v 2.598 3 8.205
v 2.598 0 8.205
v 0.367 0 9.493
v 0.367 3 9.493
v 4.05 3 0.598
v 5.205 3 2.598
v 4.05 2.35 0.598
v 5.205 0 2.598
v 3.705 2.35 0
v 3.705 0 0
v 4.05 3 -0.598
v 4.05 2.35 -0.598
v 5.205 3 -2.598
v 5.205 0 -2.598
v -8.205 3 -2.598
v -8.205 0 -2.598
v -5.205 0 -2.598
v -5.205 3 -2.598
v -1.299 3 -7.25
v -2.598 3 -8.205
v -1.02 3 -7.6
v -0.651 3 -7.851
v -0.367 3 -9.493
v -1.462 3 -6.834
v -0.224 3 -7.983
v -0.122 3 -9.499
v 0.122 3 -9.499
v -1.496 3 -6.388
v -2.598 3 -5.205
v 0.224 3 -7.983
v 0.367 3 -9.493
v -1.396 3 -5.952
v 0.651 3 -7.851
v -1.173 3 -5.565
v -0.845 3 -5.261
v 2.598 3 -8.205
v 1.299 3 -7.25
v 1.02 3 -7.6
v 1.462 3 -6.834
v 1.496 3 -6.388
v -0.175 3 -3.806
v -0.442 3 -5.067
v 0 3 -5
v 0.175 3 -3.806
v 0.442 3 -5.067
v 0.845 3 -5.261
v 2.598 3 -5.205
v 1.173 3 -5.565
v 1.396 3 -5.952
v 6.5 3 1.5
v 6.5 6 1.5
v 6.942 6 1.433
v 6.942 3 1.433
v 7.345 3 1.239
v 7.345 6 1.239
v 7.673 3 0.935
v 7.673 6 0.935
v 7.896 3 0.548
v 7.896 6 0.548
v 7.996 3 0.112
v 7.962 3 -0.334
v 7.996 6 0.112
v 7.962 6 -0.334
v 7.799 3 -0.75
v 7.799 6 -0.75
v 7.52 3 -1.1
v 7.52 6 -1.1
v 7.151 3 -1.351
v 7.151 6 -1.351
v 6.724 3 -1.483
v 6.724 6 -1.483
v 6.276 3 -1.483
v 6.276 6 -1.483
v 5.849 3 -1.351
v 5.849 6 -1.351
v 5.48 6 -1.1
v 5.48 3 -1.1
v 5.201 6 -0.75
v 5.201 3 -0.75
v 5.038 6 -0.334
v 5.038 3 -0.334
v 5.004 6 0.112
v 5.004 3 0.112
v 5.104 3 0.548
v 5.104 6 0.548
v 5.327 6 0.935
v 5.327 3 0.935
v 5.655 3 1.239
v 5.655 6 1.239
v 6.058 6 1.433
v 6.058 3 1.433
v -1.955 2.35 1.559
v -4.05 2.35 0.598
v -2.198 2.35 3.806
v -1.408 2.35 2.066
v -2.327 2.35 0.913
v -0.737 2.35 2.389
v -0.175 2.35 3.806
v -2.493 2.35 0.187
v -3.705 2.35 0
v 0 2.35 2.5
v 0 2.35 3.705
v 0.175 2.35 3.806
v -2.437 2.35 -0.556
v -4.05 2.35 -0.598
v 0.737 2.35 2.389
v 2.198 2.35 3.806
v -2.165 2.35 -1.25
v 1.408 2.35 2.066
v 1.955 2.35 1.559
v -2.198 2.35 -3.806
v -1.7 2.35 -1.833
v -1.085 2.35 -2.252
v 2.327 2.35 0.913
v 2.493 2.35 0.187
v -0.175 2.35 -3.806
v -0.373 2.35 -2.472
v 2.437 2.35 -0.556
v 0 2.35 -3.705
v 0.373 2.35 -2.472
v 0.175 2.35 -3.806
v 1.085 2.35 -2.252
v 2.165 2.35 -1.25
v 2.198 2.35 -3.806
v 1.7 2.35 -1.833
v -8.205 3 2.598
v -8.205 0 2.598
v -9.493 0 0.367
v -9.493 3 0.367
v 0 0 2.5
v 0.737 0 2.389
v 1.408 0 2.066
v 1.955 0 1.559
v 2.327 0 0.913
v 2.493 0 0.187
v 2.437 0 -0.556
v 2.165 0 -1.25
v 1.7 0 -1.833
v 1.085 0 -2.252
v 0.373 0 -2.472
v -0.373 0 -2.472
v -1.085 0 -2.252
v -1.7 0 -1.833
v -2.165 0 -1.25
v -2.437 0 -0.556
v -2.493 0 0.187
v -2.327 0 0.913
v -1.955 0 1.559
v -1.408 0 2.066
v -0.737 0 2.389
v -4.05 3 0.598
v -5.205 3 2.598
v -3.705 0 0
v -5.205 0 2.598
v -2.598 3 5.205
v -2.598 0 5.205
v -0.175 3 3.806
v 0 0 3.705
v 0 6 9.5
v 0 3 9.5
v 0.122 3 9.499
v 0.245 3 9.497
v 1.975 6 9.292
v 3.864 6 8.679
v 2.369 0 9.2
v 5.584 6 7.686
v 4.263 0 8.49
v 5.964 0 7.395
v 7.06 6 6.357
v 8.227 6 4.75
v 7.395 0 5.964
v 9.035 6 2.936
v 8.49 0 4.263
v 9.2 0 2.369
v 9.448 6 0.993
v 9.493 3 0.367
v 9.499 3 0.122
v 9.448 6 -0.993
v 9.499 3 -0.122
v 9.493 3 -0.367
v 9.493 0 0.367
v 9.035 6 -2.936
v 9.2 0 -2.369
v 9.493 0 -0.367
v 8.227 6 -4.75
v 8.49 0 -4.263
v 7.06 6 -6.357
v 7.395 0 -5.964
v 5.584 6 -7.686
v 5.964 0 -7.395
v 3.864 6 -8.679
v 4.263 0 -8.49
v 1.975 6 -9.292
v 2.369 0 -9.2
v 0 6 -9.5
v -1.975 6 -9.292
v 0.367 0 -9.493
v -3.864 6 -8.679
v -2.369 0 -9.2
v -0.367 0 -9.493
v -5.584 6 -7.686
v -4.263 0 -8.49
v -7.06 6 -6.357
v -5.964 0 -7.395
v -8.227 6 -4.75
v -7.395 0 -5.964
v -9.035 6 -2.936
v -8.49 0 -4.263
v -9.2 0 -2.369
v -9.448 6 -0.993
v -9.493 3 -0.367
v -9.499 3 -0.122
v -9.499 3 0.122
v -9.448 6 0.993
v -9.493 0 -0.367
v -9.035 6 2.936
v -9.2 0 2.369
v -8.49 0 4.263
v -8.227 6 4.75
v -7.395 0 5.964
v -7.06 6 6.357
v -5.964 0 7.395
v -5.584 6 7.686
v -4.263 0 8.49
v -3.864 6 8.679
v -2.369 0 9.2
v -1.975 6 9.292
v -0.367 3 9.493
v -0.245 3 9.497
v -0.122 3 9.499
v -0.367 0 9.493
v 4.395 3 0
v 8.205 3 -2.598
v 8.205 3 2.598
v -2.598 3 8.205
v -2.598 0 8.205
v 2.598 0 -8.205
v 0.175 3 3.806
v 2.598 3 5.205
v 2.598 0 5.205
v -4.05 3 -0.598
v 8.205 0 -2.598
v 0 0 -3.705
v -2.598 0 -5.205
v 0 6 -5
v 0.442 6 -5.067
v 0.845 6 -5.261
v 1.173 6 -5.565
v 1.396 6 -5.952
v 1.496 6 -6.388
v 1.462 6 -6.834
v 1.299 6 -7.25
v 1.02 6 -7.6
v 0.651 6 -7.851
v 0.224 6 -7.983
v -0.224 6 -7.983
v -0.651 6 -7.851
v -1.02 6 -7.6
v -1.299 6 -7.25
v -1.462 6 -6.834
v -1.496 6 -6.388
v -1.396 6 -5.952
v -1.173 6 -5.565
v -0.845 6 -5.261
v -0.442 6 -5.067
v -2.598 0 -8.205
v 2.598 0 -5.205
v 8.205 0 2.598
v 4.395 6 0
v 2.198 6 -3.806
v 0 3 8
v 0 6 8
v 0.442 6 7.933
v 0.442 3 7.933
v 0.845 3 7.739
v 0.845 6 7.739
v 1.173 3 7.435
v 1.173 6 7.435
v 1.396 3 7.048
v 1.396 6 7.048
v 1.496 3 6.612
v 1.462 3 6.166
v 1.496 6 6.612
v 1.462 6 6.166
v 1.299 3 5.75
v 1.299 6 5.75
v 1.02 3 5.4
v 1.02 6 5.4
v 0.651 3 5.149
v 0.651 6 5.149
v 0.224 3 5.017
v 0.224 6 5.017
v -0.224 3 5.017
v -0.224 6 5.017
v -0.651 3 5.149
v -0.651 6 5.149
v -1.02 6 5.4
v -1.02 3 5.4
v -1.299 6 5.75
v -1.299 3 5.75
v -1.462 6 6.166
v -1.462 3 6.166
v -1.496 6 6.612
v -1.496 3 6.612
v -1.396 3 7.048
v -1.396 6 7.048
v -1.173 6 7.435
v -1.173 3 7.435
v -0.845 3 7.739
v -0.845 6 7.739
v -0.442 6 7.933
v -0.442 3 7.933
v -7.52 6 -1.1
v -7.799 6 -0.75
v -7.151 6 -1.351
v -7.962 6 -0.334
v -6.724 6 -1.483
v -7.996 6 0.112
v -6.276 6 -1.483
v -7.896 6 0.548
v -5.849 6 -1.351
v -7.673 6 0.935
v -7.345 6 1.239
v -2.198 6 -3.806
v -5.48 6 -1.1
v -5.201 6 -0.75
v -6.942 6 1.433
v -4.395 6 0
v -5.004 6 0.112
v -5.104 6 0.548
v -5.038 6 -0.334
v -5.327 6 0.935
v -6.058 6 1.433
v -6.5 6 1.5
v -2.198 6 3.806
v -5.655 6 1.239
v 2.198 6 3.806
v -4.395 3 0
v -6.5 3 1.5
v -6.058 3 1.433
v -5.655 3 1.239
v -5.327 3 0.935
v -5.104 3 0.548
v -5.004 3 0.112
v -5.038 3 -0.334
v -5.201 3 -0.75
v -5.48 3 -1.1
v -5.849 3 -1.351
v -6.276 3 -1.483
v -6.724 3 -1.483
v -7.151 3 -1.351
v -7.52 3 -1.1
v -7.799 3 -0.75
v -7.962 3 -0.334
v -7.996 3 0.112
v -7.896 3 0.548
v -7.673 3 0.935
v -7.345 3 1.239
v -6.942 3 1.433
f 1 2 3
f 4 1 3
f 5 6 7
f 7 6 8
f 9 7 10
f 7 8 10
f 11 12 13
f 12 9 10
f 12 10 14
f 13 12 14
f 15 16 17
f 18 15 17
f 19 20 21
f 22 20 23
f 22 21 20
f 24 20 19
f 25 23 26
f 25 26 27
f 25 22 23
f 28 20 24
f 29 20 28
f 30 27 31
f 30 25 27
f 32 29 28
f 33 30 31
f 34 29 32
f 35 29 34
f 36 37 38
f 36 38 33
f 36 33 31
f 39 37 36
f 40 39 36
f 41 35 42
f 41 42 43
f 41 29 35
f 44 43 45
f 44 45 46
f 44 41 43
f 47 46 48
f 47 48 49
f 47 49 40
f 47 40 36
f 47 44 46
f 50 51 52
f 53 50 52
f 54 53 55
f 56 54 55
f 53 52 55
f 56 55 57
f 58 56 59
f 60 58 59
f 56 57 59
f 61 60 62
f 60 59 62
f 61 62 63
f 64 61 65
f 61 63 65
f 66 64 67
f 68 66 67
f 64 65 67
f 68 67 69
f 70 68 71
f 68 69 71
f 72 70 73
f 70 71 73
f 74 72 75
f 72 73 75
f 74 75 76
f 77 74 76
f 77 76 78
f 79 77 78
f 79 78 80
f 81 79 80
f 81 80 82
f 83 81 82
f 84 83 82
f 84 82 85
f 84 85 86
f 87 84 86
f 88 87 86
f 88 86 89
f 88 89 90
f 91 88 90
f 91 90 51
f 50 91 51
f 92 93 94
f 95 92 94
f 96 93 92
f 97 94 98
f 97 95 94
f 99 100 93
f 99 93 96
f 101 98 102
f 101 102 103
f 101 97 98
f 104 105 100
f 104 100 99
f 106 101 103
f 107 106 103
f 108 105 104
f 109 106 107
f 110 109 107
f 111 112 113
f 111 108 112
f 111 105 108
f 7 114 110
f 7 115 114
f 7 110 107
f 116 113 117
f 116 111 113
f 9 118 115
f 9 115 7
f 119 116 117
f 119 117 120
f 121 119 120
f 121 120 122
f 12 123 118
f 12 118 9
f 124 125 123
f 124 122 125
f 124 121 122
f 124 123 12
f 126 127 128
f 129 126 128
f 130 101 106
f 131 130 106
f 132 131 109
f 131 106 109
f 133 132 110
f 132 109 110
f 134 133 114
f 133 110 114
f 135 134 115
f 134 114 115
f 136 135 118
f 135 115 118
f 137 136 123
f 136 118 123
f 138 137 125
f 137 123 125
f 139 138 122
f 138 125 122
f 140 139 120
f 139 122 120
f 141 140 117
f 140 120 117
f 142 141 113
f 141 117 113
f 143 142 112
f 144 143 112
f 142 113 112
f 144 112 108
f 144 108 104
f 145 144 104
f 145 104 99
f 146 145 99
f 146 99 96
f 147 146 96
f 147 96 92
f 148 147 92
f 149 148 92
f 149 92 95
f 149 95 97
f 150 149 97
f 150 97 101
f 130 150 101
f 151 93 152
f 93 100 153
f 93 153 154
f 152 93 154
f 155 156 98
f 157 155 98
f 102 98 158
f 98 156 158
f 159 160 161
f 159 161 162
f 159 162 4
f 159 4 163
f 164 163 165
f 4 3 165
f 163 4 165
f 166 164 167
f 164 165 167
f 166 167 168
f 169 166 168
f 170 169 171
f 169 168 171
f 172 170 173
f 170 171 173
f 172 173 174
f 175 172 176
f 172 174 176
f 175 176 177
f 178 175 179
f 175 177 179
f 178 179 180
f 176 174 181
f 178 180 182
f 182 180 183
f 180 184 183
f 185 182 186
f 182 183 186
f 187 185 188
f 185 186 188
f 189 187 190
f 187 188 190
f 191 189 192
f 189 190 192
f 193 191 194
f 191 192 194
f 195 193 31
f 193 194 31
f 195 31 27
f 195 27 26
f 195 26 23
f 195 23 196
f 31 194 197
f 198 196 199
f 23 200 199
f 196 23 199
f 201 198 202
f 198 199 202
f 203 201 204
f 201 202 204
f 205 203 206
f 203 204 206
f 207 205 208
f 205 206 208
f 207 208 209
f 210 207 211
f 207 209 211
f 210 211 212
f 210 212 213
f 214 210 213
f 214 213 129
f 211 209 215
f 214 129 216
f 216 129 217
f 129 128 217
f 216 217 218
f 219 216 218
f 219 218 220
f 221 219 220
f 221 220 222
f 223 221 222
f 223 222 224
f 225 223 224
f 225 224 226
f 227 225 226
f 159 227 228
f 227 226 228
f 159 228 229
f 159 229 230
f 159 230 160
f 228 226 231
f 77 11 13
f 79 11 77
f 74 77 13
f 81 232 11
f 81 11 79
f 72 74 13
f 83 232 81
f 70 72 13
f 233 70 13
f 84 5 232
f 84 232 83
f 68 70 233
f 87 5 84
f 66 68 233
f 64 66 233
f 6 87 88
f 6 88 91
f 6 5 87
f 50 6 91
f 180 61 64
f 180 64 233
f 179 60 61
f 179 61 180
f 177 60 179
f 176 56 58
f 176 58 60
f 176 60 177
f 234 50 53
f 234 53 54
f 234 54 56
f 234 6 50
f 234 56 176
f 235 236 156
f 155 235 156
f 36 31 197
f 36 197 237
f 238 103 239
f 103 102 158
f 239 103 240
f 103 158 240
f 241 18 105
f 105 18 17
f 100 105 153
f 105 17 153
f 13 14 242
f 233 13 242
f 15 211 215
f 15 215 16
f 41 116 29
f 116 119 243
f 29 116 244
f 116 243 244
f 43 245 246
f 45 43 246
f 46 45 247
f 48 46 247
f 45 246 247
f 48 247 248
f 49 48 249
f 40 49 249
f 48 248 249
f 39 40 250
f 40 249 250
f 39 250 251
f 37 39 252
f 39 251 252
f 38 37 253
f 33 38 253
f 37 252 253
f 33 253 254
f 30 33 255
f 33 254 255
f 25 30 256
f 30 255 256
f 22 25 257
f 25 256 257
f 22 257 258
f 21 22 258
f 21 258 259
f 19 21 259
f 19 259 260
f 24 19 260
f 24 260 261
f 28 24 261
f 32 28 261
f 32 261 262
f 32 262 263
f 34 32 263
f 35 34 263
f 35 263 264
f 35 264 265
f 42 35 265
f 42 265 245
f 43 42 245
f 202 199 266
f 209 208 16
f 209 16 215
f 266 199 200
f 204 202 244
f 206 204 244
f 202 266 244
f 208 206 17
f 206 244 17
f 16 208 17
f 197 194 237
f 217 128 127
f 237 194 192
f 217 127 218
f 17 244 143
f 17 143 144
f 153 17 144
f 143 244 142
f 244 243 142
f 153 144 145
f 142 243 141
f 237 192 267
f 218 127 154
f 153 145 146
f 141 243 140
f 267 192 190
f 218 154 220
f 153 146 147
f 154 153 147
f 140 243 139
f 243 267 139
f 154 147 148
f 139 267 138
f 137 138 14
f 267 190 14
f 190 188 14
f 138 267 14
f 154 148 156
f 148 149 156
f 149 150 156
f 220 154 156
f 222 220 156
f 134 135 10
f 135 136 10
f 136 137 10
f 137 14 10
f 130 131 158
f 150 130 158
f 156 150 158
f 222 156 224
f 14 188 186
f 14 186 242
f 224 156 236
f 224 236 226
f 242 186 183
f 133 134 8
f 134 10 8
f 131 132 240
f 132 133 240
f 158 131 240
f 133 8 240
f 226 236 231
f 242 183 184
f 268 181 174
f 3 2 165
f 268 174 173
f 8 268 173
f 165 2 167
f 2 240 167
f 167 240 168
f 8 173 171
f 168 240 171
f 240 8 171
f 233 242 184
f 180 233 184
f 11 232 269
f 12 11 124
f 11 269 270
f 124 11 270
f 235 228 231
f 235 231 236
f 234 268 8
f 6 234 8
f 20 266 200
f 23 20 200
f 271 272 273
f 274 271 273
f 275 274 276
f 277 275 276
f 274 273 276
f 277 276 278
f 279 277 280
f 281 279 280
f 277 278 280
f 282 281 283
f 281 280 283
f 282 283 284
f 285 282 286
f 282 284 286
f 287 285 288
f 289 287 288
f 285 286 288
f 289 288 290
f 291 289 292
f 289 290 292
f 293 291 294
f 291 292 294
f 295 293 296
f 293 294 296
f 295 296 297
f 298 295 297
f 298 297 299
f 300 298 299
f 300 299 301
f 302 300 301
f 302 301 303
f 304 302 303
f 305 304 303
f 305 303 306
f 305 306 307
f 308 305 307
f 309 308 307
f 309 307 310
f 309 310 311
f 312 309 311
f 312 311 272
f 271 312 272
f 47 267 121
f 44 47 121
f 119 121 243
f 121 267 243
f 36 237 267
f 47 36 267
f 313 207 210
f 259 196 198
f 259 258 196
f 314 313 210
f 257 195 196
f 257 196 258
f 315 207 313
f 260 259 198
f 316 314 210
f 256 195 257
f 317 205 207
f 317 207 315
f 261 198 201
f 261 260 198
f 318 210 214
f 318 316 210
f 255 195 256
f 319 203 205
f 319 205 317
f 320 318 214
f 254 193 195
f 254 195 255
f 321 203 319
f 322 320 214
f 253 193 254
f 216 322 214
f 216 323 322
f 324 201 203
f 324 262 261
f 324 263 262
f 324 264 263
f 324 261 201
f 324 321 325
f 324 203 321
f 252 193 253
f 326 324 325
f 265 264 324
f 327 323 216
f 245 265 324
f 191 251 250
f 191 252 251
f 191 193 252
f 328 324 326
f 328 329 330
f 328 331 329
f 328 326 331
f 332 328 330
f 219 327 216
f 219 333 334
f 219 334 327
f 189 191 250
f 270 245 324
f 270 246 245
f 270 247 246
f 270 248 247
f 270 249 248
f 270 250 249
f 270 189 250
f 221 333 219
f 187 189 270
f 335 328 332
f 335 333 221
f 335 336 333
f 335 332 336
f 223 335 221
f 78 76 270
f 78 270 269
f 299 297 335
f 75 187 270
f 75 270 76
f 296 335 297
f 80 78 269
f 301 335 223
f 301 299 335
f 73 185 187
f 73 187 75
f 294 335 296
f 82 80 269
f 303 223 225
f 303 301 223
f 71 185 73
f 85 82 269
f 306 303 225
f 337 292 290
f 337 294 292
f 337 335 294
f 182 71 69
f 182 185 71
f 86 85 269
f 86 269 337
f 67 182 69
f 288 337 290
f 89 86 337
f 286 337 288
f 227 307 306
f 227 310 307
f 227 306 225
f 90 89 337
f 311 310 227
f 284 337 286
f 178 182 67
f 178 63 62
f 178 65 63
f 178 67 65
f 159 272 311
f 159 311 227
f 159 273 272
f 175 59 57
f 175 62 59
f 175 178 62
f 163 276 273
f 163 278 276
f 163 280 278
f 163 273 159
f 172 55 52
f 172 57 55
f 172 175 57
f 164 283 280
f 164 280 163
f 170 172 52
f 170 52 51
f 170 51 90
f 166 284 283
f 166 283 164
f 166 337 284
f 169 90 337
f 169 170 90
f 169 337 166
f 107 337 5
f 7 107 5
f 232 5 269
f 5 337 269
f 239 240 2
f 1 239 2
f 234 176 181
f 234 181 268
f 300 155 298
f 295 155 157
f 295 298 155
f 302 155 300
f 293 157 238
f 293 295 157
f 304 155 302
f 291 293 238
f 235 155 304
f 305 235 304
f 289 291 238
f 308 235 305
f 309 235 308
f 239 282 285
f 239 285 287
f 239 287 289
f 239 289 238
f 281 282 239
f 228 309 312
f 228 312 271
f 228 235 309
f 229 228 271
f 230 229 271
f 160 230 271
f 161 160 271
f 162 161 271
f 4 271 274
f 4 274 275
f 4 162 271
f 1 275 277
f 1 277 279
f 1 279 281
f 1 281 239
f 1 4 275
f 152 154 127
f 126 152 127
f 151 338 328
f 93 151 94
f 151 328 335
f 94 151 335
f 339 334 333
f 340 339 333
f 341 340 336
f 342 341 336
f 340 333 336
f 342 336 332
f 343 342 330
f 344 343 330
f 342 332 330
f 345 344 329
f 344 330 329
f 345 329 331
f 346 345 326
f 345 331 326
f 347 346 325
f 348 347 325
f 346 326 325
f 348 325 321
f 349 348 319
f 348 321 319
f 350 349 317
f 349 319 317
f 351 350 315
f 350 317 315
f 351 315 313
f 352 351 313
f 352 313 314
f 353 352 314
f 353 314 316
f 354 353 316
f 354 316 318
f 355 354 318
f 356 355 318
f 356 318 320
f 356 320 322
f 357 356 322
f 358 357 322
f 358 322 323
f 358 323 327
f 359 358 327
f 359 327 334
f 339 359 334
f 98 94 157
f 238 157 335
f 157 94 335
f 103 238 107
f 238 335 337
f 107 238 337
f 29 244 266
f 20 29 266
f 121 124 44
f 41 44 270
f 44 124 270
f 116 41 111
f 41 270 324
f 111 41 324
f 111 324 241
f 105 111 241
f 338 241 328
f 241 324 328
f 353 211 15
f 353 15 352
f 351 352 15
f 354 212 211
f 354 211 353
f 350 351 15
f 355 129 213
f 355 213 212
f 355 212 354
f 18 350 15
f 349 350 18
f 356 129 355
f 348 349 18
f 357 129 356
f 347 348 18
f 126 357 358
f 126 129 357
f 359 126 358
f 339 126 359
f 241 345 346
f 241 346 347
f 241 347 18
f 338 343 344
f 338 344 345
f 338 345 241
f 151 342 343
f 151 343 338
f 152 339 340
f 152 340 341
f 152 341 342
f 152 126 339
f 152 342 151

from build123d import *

# Parameters (mm, degrees)
SKETCH2_R           = 9.5
BOSS_EXTRUDE1_DEPTH = 6
CUT_EXTRUDE1_DEPTH  = 3.65
SKETCH4_R           = 2.5
CUT_EXTRUDE2_DEPTH  = 14.92201494
CUT_EXTRUDE4_DEPTH  = 3
SKETCH5_R           = 1.5
CUT_EXTRUDE5_DEPTH  = 15.71393897


with BuildPart() as part:
    # Sketch2 → Boss-Extrude1 (new body)
    with BuildSketch(Plane(origin=(0, 0, 0), x_dir=(1, 0, 0), z_dir=(0, 1, 0))):
        with Locations(Location((0, 0, 0), (0, 0, 270))):
            Circle(SKETCH2_R)
    extrude(amount=BOSS_EXTRUDE1_DEPTH)

    # Sketch3 → Cut-Extrude1 (cut)
    with BuildSketch(Plane(origin=(0, 6, 0), x_dir=(1, 0, 0), z_dir=(0, 1, 0))):
        Polygon((2.1975, -3.80618165), (4.395, 0), (2.1975, 3.80618165), (-2.1975, 3.80618165), (-4.395, 0), (-2.1975, -3.80618165), align=None)
    extrude(amount=-CUT_EXTRUDE1_DEPTH, mode=Mode.SUBTRACT)

    # Sketch4 → Cut-Extrude2 (cut, through all)
    with BuildSketch(Plane(origin=(0, 2.35, 0), x_dir=(1, 0, 0), z_dir=(0, 1, 0))):
        with Locations(Location((0, 0, 0), (0, 0, 270))):
            Circle(SKETCH4_R)
    extrude(amount=-CUT_EXTRUDE2_DEPTH, mode=Mode.SUBTRACT)

    # Sketch6 → Cut-Extrude4 (cut)
    with BuildSketch(Plane.XZ):
        Polygon((-2.598076211, -8.204916605), (0, -9.704916605), (2.598076211, -8.204916605), (2.598076211, -5.204916605), (0, -3.704916605), (-2.598076211, -5.204916605), align=None)
        Polygon((8.204916605, -2.598076211), (9.704916605, 0), (8.204916605, 2.598076211), (5.204916605, 2.598076211), (3.704916605, 0), (5.204916605, -2.598076211), align=None)
        Polygon((-8.204916605, 2.598076211), (-9.704916605, 0), (-8.204916605, -2.598076211), (-5.204916605, -2.598076211), (-3.704916605, 0), (-5.204916605, 2.598076211), align=None)
        Polygon((2.598076211, 8.204916605), (0, 9.704916605), (-2.598076211, 8.204916605), (-2.598076211, 5.204916605), (0, 3.704916605), (2.598076211, 5.204916605), align=None)
    extrude(amount=-CUT_EXTRUDE4_DEPTH, mode=Mode.SUBTRACT)

    # Sketch5 → Cut-Extrude5 (cut, through all)
    with BuildSketch(Plane(origin=(0, 6, 0), x_dir=(1, 0, 0), z_dir=(0, 1, 0))):
        with Locations(Location((6.5, 0, 0), (0, 0, 270))):
            Circle(SKETCH5_R)
        with Locations(Location((0, -6.5, 0), (0, 0, 270))):
            Circle(SKETCH5_R)
        with Locations(Location((-6.5, 0, 0), (0, 0, 270))):
            Circle(SKETCH5_R)
        with Locations(Location((0, 6.5, 0), (0, 0, 270))):
            Circle(SKETCH5_R)
    extrude(amount=-CUT_EXTRUDE5_DEPTH, mode=Mode.SUBTRACT)


solid = part.part
